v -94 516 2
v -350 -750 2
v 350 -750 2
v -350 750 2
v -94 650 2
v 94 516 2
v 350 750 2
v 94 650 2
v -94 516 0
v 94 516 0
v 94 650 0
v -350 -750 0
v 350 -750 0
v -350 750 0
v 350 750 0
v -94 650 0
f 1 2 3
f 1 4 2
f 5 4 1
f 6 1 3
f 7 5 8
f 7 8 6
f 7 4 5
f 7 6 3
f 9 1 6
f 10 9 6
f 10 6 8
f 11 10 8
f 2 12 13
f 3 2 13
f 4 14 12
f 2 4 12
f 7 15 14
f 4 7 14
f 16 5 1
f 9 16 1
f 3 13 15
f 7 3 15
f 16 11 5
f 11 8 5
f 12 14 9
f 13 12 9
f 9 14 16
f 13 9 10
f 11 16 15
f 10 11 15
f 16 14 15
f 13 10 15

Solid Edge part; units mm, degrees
sketch "Sketch1" plane through (0, 0, 0) normal (0, 0, 1) x (1, 0, 0)
  line L0 (350, 750) -> (-350, 750)
  line L1 (-350, 750) -> (-350, -750)
  line L2 (-350, -750) -> (350, -750)
  line L3 (350, -750) -> (350, 750)
extrude "Protrusion1" add sketch "Sketch1" along normal blind 2
sketch "Sketch2" plane through (0, 0, 2) normal (0, 0, 1) x (1, 0, 0)
  line L0 (94, 516) -> (94, 650)
  line L1 (94, 650) -> (-94, 650)
  line L2 (-94, 650) -> (-94, 516)
  line L3 (-94, 516) -> (94, 516)
extrude "ExtrudedCutout_1" cut sketch "Sketch2" against normal blind 269.0392
properties material "Aluminum, 1060"
